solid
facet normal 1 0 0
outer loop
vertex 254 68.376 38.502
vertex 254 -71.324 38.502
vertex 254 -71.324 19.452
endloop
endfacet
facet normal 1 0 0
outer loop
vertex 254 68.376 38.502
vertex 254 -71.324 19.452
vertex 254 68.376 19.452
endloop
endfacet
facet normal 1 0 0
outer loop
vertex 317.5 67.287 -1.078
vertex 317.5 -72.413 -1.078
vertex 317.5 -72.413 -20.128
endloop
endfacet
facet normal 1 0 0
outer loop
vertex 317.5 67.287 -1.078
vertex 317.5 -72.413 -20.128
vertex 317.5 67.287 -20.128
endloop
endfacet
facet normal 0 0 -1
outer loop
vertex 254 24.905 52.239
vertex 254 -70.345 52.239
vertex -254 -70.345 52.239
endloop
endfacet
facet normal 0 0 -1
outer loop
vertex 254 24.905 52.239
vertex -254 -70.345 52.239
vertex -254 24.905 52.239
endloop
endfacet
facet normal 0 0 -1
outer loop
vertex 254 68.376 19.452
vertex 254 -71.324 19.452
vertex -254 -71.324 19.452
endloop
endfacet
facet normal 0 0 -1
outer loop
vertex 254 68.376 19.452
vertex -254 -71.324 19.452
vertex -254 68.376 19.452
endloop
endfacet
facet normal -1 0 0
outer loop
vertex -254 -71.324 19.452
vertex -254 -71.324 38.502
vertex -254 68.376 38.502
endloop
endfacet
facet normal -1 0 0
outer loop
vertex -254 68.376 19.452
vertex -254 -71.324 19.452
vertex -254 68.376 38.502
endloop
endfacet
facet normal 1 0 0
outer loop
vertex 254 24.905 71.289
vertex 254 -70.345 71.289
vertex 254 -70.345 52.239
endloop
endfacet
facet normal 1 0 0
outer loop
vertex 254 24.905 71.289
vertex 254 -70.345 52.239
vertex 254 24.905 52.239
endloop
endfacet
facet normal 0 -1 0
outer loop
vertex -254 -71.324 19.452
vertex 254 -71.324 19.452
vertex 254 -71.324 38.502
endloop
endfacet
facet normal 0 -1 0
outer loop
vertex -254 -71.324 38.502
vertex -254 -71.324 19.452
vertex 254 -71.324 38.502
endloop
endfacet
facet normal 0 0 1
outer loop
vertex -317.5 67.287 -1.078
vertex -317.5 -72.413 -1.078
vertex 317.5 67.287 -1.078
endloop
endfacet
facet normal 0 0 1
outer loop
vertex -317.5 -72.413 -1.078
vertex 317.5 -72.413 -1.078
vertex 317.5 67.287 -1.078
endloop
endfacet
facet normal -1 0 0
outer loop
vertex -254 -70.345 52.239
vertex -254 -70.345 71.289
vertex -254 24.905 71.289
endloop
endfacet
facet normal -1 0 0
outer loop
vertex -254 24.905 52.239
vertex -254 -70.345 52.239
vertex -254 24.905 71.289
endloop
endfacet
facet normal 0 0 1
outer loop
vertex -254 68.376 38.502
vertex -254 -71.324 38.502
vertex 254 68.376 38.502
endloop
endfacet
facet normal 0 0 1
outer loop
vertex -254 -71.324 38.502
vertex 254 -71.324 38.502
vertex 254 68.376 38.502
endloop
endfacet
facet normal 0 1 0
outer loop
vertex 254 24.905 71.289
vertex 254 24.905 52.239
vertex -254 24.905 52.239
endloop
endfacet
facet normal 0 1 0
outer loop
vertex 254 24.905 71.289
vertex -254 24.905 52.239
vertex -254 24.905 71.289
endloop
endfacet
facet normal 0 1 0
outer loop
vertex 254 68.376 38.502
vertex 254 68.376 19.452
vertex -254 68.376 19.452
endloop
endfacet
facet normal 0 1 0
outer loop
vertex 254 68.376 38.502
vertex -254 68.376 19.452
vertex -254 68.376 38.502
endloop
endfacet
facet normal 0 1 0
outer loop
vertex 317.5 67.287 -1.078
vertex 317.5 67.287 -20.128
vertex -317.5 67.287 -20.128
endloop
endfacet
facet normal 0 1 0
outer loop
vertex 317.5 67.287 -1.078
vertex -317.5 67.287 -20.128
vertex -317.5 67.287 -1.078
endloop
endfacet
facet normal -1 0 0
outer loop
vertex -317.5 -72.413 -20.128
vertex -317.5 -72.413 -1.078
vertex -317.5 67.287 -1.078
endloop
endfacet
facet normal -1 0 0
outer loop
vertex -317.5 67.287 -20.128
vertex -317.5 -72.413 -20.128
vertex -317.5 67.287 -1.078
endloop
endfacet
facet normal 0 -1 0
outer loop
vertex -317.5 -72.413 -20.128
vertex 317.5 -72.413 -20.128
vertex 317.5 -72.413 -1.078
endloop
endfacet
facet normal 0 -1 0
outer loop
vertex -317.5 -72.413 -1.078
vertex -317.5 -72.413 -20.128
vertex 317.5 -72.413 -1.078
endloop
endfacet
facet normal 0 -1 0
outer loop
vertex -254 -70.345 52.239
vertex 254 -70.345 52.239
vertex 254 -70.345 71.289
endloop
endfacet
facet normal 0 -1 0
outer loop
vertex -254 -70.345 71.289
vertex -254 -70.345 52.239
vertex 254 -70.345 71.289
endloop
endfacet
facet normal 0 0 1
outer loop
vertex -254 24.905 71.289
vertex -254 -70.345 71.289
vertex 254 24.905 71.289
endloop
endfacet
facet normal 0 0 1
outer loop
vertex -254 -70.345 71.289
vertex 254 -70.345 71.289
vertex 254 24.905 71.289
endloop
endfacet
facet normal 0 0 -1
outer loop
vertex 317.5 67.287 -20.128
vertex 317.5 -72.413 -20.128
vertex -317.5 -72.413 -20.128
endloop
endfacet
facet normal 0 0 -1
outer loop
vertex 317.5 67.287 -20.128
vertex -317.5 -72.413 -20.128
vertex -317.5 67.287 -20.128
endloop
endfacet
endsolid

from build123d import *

# Parameters (mm, degrees)
F0_W     = 95.25
F0_H     = 19.05
F1_DEPTH = 254
F2_W     = 139.7
F2_H     = 19.05
F3_DEPTH = 254
F4_W     = 139.7
F4_H     = 19.05
F5_DEPTH = 317.5


with BuildPart() as f1:
    # F0 (on Right) → F1 (new body, symmetric)
    with BuildSketch(Plane.YZ):
        with Locations((-22.720186, 61.763949)):
            Rectangle(F0_W, F0_H)
    extrude(amount=F1_DEPTH, both=True)


with BuildPart() as f3:
    # F2 (on Right) → F3 (new body, symmetric)
    with BuildSketch(Plane.YZ):
        with Locations((-1.473901, 28.976972)):
            Rectangle(F2_W, F2_H)
    extrude(amount=F3_DEPTH, both=True)


with BuildPart() as f5:
    # F4 (on Right) → F5 (new body, symmetric)
    with BuildSketch(Plane.YZ):
        with Locations((-2.5633, -10.602863)):
            Rectangle(F4_W, F4_H)
    extrude(amount=F5_DEPTH, both=True)


solid = Compound([f1.part, f3.part, f5.part])
